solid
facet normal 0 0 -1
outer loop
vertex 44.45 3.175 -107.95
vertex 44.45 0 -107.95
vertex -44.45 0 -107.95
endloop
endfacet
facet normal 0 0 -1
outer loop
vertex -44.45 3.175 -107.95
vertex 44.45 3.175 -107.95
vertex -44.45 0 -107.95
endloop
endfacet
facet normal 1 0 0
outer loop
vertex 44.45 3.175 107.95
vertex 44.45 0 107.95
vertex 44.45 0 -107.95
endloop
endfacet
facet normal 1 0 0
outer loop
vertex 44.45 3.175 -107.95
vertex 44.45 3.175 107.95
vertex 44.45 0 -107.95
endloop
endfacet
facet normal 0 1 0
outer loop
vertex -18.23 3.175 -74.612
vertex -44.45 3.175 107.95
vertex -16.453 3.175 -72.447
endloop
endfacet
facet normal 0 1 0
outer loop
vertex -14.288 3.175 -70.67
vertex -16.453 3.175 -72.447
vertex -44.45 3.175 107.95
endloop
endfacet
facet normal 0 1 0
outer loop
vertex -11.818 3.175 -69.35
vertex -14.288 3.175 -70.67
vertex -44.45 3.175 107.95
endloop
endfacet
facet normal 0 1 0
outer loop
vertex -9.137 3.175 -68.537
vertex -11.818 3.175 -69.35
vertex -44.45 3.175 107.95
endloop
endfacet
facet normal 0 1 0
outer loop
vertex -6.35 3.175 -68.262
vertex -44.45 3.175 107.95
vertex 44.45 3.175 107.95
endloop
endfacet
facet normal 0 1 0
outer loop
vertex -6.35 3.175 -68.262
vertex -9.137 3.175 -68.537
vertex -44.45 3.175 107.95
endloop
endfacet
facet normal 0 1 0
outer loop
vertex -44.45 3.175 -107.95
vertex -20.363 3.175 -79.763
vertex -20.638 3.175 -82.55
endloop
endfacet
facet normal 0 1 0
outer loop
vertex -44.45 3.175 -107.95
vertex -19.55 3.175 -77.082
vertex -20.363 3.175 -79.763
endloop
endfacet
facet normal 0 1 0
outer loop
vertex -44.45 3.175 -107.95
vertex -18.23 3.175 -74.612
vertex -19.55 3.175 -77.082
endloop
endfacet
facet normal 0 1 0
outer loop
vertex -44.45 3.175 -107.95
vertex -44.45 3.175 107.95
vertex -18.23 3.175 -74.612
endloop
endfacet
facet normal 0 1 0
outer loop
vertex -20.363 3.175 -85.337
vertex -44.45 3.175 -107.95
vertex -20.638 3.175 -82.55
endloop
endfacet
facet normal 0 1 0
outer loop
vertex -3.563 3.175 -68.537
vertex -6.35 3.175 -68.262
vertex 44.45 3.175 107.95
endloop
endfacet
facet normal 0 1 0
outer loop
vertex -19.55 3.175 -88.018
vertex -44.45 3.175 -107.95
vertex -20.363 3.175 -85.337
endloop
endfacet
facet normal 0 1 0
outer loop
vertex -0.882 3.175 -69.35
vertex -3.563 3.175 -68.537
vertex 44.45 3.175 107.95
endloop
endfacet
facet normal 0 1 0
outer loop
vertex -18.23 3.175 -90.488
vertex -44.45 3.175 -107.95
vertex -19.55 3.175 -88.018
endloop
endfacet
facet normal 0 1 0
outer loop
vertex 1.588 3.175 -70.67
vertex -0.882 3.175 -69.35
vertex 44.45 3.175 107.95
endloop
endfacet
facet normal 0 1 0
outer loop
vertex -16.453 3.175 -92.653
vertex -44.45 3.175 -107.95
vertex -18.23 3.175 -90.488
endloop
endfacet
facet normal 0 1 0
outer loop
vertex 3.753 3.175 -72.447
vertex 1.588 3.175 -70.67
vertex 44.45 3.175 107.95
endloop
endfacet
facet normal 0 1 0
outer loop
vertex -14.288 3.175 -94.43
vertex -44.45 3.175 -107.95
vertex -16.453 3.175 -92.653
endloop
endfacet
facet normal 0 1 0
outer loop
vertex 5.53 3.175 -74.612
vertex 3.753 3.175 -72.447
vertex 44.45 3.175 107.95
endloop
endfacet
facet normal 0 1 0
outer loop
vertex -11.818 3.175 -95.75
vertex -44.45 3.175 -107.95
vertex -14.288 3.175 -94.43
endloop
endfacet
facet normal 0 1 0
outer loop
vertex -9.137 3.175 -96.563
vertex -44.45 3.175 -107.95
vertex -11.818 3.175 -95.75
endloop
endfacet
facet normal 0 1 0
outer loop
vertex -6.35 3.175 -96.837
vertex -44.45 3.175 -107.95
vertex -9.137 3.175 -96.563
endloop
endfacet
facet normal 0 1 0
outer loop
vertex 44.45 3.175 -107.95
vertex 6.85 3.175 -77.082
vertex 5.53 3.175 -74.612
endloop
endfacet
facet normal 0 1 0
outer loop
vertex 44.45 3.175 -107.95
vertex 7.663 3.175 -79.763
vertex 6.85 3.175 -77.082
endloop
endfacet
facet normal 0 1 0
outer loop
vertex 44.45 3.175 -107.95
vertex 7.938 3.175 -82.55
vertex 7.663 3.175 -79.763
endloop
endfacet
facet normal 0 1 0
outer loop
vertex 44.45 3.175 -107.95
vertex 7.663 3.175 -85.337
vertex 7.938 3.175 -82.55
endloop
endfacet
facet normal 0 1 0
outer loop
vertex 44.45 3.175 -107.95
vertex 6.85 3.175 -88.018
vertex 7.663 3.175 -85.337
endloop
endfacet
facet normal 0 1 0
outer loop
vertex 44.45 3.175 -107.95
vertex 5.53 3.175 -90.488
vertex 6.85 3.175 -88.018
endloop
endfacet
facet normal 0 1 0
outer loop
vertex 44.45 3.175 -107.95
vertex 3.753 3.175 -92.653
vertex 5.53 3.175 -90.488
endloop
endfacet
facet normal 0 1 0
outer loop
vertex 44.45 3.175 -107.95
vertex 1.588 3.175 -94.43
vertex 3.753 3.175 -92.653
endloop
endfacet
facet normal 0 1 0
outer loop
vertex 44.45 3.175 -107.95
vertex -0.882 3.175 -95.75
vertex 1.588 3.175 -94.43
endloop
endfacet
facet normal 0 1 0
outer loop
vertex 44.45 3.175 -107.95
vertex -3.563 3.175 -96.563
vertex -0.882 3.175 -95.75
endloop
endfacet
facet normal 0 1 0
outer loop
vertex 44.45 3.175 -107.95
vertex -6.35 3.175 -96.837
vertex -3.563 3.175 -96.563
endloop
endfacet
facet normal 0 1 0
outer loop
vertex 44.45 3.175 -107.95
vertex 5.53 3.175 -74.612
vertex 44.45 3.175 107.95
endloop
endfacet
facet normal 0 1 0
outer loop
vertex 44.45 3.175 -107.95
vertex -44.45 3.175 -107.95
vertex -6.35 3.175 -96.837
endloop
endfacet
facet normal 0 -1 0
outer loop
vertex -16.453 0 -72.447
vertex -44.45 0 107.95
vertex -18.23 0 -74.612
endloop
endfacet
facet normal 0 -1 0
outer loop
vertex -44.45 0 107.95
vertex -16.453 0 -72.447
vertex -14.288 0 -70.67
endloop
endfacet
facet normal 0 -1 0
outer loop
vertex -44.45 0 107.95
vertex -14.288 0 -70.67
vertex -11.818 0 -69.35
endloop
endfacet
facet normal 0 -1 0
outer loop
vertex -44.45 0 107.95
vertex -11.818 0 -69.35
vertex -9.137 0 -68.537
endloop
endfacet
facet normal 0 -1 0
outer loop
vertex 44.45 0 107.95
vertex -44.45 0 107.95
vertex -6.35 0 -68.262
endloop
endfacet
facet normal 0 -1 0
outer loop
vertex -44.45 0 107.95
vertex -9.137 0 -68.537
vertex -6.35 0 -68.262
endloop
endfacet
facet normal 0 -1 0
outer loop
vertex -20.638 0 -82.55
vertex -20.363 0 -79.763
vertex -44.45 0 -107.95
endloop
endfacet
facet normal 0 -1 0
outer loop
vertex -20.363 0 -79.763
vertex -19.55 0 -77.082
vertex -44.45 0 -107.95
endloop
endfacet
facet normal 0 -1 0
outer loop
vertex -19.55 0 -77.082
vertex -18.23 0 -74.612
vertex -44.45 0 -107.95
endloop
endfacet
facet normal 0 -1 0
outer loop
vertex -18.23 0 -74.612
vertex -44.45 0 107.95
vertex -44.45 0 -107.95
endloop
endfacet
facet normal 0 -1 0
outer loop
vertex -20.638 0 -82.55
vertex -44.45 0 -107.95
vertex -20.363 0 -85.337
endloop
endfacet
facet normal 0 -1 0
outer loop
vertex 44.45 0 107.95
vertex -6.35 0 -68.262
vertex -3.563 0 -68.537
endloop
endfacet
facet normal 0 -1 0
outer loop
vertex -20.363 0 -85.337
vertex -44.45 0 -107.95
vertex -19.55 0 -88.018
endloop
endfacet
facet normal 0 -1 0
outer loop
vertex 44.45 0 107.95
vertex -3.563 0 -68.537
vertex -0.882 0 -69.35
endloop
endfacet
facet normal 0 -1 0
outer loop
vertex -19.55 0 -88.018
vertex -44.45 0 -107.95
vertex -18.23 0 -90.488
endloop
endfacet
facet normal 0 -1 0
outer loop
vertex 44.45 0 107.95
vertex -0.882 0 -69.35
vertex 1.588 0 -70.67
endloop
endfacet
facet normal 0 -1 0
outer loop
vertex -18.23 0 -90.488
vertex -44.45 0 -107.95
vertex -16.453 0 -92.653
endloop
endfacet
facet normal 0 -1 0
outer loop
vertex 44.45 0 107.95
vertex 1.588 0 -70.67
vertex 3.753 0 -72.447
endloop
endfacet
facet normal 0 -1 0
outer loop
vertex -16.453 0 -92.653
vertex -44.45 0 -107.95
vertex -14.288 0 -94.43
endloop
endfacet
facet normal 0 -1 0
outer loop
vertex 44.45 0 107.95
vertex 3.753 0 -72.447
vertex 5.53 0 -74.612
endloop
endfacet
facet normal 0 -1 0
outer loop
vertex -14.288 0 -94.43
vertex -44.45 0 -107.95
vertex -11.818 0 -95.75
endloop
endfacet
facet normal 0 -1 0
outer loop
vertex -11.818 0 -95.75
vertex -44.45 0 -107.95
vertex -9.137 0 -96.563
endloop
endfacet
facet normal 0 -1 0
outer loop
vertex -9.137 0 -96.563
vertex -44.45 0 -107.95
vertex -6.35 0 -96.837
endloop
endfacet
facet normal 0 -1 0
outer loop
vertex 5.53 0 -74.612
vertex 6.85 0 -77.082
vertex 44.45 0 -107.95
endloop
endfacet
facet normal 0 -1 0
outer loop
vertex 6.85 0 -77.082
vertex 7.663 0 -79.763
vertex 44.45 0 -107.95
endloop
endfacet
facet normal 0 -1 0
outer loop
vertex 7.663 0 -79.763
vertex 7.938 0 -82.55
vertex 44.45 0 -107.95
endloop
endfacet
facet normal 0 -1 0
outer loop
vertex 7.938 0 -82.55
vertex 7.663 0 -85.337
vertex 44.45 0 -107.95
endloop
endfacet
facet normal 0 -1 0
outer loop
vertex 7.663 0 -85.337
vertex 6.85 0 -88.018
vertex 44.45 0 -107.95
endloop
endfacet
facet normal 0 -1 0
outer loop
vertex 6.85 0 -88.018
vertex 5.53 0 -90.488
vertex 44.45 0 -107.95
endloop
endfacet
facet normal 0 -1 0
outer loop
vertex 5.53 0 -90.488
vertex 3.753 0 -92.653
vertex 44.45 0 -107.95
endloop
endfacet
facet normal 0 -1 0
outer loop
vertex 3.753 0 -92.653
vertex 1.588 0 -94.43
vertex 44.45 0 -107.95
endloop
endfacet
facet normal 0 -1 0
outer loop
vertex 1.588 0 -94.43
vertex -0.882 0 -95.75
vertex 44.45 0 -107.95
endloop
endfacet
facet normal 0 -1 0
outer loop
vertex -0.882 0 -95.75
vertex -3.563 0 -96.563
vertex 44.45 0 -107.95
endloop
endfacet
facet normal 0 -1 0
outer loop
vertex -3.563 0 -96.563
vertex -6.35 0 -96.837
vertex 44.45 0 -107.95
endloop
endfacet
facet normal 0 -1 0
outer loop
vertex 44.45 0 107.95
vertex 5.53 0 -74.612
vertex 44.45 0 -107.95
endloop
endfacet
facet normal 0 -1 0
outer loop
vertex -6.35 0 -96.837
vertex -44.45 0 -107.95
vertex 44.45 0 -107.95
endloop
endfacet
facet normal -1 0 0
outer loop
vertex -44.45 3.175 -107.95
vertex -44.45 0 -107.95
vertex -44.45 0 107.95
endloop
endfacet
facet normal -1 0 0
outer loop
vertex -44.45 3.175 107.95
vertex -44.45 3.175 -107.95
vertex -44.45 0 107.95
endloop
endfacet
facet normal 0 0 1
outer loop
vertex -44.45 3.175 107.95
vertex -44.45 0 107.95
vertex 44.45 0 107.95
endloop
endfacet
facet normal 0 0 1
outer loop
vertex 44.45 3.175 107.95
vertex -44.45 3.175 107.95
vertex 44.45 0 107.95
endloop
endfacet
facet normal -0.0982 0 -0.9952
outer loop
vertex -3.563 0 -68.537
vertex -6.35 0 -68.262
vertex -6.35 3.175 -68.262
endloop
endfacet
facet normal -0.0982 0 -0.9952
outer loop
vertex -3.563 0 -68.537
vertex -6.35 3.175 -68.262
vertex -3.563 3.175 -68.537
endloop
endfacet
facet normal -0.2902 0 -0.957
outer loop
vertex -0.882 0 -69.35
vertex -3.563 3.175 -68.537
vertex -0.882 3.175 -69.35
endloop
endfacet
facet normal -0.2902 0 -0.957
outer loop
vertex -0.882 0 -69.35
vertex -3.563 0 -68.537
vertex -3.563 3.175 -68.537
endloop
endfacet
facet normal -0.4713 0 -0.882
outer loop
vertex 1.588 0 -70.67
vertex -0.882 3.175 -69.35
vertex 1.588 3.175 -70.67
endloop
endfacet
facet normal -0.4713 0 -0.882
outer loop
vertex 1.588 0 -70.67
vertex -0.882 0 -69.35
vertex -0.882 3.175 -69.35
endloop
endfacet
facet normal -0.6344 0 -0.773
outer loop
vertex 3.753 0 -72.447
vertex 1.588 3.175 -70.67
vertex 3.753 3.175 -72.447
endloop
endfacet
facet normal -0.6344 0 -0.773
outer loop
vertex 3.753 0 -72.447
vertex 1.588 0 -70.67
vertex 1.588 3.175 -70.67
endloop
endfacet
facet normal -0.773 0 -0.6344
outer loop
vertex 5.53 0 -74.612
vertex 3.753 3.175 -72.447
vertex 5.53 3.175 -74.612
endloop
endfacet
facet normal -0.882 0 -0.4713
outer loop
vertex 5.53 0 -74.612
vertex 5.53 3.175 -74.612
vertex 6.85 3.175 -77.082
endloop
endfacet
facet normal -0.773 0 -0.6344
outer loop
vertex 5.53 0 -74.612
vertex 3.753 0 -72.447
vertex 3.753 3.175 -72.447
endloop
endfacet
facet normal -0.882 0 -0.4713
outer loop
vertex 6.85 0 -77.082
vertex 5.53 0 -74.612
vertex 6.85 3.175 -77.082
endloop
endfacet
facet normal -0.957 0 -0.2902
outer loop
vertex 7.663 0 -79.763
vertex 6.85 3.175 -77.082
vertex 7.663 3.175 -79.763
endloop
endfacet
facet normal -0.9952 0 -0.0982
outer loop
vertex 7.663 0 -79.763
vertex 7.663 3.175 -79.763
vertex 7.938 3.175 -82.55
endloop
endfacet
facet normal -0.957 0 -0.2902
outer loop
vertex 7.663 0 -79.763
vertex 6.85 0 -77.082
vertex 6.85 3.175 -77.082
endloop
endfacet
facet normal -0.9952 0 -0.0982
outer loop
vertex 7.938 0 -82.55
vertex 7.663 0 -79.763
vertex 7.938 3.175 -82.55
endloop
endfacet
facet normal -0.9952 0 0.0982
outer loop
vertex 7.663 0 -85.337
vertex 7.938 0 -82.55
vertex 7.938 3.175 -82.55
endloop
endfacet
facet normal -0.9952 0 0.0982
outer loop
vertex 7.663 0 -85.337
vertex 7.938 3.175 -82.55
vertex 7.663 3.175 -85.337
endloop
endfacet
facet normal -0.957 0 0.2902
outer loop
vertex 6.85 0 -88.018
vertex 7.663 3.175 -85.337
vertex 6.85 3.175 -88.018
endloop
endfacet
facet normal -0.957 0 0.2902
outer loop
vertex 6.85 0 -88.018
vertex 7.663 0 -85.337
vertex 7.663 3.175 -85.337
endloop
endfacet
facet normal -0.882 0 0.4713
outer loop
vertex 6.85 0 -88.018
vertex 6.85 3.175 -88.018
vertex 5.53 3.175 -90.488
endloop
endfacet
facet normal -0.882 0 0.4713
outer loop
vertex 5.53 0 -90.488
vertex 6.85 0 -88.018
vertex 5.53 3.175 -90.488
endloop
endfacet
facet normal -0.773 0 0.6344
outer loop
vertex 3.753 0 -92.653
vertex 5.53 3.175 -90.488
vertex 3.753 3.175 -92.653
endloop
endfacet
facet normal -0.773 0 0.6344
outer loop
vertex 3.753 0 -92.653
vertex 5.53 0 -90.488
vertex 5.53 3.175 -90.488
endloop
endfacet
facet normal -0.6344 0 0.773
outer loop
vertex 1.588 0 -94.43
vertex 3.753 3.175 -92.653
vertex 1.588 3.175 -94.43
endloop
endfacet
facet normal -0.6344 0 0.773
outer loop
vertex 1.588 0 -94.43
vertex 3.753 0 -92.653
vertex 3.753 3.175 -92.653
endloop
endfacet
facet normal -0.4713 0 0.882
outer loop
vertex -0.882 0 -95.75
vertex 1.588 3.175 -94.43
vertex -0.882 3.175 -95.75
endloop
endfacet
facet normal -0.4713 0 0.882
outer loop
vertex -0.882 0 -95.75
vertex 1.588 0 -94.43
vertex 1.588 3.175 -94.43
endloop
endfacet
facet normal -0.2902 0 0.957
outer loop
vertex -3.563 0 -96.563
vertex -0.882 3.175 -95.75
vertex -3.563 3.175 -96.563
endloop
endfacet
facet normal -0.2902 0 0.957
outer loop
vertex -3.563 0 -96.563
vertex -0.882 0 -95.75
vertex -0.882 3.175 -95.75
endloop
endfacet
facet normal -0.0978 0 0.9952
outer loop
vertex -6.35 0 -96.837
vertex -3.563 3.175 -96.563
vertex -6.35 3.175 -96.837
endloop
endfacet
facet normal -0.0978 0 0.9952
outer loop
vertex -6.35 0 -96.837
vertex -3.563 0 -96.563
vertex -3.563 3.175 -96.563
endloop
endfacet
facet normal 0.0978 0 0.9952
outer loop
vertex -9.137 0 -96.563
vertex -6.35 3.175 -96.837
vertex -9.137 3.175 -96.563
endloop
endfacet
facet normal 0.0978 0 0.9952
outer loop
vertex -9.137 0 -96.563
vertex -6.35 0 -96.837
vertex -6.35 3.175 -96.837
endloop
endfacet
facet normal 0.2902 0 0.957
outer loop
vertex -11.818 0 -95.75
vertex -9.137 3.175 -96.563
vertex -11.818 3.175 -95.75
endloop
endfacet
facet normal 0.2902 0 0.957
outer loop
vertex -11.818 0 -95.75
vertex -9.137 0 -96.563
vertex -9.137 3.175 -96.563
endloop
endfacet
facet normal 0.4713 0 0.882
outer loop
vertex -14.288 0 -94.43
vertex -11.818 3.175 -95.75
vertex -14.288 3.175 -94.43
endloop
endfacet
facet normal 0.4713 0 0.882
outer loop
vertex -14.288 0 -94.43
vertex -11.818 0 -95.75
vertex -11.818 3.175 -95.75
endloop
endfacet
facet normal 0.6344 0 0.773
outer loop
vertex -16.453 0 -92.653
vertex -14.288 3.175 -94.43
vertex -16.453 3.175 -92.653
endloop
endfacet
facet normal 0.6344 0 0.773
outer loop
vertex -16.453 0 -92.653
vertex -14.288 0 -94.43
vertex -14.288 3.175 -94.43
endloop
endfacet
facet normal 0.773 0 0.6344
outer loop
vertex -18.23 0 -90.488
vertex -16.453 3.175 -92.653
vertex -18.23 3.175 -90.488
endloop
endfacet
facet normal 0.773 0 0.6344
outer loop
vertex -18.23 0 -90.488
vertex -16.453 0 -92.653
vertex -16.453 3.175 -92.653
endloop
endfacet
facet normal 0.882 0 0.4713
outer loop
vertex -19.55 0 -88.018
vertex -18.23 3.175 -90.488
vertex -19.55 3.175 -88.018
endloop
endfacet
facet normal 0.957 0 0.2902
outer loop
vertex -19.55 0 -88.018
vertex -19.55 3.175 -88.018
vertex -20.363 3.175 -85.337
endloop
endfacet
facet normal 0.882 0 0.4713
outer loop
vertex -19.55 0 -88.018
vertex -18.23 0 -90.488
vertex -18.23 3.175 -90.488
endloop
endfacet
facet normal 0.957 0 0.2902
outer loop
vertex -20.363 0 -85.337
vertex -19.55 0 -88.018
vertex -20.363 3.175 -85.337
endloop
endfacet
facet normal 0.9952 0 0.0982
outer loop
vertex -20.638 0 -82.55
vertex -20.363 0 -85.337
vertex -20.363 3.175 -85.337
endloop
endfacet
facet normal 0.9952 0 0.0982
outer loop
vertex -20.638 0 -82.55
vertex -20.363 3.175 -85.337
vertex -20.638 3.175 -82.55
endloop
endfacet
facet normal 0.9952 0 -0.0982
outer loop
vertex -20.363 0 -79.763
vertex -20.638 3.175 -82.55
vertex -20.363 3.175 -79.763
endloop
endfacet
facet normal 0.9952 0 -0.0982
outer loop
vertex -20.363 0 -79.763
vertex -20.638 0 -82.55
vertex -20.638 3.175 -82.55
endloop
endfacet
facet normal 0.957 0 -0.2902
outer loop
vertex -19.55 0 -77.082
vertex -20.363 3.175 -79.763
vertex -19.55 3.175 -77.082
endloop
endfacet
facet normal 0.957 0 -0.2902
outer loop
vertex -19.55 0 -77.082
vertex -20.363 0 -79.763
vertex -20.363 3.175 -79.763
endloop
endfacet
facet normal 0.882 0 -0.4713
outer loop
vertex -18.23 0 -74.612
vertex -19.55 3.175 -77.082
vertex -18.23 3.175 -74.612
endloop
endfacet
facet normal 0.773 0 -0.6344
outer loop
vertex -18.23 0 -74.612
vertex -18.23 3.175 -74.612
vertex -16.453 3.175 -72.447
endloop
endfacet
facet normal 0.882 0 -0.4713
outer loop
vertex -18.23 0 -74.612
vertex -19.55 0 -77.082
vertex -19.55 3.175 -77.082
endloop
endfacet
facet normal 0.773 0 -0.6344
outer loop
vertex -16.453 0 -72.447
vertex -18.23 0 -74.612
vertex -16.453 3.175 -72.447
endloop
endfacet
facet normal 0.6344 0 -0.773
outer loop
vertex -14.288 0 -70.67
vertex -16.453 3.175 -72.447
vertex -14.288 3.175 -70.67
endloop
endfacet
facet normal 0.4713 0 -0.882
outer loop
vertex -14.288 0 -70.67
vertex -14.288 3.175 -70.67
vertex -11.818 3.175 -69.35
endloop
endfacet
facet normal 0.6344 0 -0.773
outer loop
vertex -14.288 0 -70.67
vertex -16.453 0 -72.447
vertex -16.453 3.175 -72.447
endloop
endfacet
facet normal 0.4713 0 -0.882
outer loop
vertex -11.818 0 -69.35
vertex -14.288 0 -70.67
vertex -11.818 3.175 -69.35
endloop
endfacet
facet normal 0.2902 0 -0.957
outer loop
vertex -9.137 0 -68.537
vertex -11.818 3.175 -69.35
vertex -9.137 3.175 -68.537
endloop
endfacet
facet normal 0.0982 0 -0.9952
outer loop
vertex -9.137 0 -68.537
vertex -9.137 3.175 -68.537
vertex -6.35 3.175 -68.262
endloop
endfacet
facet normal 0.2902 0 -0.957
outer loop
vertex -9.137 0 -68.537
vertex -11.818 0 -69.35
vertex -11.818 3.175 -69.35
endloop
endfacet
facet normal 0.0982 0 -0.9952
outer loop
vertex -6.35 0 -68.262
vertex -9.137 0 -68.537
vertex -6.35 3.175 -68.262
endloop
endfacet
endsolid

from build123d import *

# Parameters (mm, degrees)
SKETCH1_R           = 14.2875
BOSS_EXTRUDE1_DEPTH = 3.175


with BuildPart() as part:
    # Sketch1 → Boss-Extrude1 (new body)
    with BuildSketch(Plane(origin=(0, 0, 0), x_dir=(1, 0, 0), z_dir=(0, 1, 0))):
        Polygon((-44.45, -107.95), (44.45, -107.95), (44.45, -31.75), (44.45, 107.95), (-44.45, 107.95), align=None)
        with Locations(Location((-6.35, 82.55, 0), (0, 0, 270))):
            Circle(SKETCH1_R, mode=Mode.SUBTRACT)
    extrude(amount=BOSS_EXTRUDE1_DEPTH)


solid = part.part
